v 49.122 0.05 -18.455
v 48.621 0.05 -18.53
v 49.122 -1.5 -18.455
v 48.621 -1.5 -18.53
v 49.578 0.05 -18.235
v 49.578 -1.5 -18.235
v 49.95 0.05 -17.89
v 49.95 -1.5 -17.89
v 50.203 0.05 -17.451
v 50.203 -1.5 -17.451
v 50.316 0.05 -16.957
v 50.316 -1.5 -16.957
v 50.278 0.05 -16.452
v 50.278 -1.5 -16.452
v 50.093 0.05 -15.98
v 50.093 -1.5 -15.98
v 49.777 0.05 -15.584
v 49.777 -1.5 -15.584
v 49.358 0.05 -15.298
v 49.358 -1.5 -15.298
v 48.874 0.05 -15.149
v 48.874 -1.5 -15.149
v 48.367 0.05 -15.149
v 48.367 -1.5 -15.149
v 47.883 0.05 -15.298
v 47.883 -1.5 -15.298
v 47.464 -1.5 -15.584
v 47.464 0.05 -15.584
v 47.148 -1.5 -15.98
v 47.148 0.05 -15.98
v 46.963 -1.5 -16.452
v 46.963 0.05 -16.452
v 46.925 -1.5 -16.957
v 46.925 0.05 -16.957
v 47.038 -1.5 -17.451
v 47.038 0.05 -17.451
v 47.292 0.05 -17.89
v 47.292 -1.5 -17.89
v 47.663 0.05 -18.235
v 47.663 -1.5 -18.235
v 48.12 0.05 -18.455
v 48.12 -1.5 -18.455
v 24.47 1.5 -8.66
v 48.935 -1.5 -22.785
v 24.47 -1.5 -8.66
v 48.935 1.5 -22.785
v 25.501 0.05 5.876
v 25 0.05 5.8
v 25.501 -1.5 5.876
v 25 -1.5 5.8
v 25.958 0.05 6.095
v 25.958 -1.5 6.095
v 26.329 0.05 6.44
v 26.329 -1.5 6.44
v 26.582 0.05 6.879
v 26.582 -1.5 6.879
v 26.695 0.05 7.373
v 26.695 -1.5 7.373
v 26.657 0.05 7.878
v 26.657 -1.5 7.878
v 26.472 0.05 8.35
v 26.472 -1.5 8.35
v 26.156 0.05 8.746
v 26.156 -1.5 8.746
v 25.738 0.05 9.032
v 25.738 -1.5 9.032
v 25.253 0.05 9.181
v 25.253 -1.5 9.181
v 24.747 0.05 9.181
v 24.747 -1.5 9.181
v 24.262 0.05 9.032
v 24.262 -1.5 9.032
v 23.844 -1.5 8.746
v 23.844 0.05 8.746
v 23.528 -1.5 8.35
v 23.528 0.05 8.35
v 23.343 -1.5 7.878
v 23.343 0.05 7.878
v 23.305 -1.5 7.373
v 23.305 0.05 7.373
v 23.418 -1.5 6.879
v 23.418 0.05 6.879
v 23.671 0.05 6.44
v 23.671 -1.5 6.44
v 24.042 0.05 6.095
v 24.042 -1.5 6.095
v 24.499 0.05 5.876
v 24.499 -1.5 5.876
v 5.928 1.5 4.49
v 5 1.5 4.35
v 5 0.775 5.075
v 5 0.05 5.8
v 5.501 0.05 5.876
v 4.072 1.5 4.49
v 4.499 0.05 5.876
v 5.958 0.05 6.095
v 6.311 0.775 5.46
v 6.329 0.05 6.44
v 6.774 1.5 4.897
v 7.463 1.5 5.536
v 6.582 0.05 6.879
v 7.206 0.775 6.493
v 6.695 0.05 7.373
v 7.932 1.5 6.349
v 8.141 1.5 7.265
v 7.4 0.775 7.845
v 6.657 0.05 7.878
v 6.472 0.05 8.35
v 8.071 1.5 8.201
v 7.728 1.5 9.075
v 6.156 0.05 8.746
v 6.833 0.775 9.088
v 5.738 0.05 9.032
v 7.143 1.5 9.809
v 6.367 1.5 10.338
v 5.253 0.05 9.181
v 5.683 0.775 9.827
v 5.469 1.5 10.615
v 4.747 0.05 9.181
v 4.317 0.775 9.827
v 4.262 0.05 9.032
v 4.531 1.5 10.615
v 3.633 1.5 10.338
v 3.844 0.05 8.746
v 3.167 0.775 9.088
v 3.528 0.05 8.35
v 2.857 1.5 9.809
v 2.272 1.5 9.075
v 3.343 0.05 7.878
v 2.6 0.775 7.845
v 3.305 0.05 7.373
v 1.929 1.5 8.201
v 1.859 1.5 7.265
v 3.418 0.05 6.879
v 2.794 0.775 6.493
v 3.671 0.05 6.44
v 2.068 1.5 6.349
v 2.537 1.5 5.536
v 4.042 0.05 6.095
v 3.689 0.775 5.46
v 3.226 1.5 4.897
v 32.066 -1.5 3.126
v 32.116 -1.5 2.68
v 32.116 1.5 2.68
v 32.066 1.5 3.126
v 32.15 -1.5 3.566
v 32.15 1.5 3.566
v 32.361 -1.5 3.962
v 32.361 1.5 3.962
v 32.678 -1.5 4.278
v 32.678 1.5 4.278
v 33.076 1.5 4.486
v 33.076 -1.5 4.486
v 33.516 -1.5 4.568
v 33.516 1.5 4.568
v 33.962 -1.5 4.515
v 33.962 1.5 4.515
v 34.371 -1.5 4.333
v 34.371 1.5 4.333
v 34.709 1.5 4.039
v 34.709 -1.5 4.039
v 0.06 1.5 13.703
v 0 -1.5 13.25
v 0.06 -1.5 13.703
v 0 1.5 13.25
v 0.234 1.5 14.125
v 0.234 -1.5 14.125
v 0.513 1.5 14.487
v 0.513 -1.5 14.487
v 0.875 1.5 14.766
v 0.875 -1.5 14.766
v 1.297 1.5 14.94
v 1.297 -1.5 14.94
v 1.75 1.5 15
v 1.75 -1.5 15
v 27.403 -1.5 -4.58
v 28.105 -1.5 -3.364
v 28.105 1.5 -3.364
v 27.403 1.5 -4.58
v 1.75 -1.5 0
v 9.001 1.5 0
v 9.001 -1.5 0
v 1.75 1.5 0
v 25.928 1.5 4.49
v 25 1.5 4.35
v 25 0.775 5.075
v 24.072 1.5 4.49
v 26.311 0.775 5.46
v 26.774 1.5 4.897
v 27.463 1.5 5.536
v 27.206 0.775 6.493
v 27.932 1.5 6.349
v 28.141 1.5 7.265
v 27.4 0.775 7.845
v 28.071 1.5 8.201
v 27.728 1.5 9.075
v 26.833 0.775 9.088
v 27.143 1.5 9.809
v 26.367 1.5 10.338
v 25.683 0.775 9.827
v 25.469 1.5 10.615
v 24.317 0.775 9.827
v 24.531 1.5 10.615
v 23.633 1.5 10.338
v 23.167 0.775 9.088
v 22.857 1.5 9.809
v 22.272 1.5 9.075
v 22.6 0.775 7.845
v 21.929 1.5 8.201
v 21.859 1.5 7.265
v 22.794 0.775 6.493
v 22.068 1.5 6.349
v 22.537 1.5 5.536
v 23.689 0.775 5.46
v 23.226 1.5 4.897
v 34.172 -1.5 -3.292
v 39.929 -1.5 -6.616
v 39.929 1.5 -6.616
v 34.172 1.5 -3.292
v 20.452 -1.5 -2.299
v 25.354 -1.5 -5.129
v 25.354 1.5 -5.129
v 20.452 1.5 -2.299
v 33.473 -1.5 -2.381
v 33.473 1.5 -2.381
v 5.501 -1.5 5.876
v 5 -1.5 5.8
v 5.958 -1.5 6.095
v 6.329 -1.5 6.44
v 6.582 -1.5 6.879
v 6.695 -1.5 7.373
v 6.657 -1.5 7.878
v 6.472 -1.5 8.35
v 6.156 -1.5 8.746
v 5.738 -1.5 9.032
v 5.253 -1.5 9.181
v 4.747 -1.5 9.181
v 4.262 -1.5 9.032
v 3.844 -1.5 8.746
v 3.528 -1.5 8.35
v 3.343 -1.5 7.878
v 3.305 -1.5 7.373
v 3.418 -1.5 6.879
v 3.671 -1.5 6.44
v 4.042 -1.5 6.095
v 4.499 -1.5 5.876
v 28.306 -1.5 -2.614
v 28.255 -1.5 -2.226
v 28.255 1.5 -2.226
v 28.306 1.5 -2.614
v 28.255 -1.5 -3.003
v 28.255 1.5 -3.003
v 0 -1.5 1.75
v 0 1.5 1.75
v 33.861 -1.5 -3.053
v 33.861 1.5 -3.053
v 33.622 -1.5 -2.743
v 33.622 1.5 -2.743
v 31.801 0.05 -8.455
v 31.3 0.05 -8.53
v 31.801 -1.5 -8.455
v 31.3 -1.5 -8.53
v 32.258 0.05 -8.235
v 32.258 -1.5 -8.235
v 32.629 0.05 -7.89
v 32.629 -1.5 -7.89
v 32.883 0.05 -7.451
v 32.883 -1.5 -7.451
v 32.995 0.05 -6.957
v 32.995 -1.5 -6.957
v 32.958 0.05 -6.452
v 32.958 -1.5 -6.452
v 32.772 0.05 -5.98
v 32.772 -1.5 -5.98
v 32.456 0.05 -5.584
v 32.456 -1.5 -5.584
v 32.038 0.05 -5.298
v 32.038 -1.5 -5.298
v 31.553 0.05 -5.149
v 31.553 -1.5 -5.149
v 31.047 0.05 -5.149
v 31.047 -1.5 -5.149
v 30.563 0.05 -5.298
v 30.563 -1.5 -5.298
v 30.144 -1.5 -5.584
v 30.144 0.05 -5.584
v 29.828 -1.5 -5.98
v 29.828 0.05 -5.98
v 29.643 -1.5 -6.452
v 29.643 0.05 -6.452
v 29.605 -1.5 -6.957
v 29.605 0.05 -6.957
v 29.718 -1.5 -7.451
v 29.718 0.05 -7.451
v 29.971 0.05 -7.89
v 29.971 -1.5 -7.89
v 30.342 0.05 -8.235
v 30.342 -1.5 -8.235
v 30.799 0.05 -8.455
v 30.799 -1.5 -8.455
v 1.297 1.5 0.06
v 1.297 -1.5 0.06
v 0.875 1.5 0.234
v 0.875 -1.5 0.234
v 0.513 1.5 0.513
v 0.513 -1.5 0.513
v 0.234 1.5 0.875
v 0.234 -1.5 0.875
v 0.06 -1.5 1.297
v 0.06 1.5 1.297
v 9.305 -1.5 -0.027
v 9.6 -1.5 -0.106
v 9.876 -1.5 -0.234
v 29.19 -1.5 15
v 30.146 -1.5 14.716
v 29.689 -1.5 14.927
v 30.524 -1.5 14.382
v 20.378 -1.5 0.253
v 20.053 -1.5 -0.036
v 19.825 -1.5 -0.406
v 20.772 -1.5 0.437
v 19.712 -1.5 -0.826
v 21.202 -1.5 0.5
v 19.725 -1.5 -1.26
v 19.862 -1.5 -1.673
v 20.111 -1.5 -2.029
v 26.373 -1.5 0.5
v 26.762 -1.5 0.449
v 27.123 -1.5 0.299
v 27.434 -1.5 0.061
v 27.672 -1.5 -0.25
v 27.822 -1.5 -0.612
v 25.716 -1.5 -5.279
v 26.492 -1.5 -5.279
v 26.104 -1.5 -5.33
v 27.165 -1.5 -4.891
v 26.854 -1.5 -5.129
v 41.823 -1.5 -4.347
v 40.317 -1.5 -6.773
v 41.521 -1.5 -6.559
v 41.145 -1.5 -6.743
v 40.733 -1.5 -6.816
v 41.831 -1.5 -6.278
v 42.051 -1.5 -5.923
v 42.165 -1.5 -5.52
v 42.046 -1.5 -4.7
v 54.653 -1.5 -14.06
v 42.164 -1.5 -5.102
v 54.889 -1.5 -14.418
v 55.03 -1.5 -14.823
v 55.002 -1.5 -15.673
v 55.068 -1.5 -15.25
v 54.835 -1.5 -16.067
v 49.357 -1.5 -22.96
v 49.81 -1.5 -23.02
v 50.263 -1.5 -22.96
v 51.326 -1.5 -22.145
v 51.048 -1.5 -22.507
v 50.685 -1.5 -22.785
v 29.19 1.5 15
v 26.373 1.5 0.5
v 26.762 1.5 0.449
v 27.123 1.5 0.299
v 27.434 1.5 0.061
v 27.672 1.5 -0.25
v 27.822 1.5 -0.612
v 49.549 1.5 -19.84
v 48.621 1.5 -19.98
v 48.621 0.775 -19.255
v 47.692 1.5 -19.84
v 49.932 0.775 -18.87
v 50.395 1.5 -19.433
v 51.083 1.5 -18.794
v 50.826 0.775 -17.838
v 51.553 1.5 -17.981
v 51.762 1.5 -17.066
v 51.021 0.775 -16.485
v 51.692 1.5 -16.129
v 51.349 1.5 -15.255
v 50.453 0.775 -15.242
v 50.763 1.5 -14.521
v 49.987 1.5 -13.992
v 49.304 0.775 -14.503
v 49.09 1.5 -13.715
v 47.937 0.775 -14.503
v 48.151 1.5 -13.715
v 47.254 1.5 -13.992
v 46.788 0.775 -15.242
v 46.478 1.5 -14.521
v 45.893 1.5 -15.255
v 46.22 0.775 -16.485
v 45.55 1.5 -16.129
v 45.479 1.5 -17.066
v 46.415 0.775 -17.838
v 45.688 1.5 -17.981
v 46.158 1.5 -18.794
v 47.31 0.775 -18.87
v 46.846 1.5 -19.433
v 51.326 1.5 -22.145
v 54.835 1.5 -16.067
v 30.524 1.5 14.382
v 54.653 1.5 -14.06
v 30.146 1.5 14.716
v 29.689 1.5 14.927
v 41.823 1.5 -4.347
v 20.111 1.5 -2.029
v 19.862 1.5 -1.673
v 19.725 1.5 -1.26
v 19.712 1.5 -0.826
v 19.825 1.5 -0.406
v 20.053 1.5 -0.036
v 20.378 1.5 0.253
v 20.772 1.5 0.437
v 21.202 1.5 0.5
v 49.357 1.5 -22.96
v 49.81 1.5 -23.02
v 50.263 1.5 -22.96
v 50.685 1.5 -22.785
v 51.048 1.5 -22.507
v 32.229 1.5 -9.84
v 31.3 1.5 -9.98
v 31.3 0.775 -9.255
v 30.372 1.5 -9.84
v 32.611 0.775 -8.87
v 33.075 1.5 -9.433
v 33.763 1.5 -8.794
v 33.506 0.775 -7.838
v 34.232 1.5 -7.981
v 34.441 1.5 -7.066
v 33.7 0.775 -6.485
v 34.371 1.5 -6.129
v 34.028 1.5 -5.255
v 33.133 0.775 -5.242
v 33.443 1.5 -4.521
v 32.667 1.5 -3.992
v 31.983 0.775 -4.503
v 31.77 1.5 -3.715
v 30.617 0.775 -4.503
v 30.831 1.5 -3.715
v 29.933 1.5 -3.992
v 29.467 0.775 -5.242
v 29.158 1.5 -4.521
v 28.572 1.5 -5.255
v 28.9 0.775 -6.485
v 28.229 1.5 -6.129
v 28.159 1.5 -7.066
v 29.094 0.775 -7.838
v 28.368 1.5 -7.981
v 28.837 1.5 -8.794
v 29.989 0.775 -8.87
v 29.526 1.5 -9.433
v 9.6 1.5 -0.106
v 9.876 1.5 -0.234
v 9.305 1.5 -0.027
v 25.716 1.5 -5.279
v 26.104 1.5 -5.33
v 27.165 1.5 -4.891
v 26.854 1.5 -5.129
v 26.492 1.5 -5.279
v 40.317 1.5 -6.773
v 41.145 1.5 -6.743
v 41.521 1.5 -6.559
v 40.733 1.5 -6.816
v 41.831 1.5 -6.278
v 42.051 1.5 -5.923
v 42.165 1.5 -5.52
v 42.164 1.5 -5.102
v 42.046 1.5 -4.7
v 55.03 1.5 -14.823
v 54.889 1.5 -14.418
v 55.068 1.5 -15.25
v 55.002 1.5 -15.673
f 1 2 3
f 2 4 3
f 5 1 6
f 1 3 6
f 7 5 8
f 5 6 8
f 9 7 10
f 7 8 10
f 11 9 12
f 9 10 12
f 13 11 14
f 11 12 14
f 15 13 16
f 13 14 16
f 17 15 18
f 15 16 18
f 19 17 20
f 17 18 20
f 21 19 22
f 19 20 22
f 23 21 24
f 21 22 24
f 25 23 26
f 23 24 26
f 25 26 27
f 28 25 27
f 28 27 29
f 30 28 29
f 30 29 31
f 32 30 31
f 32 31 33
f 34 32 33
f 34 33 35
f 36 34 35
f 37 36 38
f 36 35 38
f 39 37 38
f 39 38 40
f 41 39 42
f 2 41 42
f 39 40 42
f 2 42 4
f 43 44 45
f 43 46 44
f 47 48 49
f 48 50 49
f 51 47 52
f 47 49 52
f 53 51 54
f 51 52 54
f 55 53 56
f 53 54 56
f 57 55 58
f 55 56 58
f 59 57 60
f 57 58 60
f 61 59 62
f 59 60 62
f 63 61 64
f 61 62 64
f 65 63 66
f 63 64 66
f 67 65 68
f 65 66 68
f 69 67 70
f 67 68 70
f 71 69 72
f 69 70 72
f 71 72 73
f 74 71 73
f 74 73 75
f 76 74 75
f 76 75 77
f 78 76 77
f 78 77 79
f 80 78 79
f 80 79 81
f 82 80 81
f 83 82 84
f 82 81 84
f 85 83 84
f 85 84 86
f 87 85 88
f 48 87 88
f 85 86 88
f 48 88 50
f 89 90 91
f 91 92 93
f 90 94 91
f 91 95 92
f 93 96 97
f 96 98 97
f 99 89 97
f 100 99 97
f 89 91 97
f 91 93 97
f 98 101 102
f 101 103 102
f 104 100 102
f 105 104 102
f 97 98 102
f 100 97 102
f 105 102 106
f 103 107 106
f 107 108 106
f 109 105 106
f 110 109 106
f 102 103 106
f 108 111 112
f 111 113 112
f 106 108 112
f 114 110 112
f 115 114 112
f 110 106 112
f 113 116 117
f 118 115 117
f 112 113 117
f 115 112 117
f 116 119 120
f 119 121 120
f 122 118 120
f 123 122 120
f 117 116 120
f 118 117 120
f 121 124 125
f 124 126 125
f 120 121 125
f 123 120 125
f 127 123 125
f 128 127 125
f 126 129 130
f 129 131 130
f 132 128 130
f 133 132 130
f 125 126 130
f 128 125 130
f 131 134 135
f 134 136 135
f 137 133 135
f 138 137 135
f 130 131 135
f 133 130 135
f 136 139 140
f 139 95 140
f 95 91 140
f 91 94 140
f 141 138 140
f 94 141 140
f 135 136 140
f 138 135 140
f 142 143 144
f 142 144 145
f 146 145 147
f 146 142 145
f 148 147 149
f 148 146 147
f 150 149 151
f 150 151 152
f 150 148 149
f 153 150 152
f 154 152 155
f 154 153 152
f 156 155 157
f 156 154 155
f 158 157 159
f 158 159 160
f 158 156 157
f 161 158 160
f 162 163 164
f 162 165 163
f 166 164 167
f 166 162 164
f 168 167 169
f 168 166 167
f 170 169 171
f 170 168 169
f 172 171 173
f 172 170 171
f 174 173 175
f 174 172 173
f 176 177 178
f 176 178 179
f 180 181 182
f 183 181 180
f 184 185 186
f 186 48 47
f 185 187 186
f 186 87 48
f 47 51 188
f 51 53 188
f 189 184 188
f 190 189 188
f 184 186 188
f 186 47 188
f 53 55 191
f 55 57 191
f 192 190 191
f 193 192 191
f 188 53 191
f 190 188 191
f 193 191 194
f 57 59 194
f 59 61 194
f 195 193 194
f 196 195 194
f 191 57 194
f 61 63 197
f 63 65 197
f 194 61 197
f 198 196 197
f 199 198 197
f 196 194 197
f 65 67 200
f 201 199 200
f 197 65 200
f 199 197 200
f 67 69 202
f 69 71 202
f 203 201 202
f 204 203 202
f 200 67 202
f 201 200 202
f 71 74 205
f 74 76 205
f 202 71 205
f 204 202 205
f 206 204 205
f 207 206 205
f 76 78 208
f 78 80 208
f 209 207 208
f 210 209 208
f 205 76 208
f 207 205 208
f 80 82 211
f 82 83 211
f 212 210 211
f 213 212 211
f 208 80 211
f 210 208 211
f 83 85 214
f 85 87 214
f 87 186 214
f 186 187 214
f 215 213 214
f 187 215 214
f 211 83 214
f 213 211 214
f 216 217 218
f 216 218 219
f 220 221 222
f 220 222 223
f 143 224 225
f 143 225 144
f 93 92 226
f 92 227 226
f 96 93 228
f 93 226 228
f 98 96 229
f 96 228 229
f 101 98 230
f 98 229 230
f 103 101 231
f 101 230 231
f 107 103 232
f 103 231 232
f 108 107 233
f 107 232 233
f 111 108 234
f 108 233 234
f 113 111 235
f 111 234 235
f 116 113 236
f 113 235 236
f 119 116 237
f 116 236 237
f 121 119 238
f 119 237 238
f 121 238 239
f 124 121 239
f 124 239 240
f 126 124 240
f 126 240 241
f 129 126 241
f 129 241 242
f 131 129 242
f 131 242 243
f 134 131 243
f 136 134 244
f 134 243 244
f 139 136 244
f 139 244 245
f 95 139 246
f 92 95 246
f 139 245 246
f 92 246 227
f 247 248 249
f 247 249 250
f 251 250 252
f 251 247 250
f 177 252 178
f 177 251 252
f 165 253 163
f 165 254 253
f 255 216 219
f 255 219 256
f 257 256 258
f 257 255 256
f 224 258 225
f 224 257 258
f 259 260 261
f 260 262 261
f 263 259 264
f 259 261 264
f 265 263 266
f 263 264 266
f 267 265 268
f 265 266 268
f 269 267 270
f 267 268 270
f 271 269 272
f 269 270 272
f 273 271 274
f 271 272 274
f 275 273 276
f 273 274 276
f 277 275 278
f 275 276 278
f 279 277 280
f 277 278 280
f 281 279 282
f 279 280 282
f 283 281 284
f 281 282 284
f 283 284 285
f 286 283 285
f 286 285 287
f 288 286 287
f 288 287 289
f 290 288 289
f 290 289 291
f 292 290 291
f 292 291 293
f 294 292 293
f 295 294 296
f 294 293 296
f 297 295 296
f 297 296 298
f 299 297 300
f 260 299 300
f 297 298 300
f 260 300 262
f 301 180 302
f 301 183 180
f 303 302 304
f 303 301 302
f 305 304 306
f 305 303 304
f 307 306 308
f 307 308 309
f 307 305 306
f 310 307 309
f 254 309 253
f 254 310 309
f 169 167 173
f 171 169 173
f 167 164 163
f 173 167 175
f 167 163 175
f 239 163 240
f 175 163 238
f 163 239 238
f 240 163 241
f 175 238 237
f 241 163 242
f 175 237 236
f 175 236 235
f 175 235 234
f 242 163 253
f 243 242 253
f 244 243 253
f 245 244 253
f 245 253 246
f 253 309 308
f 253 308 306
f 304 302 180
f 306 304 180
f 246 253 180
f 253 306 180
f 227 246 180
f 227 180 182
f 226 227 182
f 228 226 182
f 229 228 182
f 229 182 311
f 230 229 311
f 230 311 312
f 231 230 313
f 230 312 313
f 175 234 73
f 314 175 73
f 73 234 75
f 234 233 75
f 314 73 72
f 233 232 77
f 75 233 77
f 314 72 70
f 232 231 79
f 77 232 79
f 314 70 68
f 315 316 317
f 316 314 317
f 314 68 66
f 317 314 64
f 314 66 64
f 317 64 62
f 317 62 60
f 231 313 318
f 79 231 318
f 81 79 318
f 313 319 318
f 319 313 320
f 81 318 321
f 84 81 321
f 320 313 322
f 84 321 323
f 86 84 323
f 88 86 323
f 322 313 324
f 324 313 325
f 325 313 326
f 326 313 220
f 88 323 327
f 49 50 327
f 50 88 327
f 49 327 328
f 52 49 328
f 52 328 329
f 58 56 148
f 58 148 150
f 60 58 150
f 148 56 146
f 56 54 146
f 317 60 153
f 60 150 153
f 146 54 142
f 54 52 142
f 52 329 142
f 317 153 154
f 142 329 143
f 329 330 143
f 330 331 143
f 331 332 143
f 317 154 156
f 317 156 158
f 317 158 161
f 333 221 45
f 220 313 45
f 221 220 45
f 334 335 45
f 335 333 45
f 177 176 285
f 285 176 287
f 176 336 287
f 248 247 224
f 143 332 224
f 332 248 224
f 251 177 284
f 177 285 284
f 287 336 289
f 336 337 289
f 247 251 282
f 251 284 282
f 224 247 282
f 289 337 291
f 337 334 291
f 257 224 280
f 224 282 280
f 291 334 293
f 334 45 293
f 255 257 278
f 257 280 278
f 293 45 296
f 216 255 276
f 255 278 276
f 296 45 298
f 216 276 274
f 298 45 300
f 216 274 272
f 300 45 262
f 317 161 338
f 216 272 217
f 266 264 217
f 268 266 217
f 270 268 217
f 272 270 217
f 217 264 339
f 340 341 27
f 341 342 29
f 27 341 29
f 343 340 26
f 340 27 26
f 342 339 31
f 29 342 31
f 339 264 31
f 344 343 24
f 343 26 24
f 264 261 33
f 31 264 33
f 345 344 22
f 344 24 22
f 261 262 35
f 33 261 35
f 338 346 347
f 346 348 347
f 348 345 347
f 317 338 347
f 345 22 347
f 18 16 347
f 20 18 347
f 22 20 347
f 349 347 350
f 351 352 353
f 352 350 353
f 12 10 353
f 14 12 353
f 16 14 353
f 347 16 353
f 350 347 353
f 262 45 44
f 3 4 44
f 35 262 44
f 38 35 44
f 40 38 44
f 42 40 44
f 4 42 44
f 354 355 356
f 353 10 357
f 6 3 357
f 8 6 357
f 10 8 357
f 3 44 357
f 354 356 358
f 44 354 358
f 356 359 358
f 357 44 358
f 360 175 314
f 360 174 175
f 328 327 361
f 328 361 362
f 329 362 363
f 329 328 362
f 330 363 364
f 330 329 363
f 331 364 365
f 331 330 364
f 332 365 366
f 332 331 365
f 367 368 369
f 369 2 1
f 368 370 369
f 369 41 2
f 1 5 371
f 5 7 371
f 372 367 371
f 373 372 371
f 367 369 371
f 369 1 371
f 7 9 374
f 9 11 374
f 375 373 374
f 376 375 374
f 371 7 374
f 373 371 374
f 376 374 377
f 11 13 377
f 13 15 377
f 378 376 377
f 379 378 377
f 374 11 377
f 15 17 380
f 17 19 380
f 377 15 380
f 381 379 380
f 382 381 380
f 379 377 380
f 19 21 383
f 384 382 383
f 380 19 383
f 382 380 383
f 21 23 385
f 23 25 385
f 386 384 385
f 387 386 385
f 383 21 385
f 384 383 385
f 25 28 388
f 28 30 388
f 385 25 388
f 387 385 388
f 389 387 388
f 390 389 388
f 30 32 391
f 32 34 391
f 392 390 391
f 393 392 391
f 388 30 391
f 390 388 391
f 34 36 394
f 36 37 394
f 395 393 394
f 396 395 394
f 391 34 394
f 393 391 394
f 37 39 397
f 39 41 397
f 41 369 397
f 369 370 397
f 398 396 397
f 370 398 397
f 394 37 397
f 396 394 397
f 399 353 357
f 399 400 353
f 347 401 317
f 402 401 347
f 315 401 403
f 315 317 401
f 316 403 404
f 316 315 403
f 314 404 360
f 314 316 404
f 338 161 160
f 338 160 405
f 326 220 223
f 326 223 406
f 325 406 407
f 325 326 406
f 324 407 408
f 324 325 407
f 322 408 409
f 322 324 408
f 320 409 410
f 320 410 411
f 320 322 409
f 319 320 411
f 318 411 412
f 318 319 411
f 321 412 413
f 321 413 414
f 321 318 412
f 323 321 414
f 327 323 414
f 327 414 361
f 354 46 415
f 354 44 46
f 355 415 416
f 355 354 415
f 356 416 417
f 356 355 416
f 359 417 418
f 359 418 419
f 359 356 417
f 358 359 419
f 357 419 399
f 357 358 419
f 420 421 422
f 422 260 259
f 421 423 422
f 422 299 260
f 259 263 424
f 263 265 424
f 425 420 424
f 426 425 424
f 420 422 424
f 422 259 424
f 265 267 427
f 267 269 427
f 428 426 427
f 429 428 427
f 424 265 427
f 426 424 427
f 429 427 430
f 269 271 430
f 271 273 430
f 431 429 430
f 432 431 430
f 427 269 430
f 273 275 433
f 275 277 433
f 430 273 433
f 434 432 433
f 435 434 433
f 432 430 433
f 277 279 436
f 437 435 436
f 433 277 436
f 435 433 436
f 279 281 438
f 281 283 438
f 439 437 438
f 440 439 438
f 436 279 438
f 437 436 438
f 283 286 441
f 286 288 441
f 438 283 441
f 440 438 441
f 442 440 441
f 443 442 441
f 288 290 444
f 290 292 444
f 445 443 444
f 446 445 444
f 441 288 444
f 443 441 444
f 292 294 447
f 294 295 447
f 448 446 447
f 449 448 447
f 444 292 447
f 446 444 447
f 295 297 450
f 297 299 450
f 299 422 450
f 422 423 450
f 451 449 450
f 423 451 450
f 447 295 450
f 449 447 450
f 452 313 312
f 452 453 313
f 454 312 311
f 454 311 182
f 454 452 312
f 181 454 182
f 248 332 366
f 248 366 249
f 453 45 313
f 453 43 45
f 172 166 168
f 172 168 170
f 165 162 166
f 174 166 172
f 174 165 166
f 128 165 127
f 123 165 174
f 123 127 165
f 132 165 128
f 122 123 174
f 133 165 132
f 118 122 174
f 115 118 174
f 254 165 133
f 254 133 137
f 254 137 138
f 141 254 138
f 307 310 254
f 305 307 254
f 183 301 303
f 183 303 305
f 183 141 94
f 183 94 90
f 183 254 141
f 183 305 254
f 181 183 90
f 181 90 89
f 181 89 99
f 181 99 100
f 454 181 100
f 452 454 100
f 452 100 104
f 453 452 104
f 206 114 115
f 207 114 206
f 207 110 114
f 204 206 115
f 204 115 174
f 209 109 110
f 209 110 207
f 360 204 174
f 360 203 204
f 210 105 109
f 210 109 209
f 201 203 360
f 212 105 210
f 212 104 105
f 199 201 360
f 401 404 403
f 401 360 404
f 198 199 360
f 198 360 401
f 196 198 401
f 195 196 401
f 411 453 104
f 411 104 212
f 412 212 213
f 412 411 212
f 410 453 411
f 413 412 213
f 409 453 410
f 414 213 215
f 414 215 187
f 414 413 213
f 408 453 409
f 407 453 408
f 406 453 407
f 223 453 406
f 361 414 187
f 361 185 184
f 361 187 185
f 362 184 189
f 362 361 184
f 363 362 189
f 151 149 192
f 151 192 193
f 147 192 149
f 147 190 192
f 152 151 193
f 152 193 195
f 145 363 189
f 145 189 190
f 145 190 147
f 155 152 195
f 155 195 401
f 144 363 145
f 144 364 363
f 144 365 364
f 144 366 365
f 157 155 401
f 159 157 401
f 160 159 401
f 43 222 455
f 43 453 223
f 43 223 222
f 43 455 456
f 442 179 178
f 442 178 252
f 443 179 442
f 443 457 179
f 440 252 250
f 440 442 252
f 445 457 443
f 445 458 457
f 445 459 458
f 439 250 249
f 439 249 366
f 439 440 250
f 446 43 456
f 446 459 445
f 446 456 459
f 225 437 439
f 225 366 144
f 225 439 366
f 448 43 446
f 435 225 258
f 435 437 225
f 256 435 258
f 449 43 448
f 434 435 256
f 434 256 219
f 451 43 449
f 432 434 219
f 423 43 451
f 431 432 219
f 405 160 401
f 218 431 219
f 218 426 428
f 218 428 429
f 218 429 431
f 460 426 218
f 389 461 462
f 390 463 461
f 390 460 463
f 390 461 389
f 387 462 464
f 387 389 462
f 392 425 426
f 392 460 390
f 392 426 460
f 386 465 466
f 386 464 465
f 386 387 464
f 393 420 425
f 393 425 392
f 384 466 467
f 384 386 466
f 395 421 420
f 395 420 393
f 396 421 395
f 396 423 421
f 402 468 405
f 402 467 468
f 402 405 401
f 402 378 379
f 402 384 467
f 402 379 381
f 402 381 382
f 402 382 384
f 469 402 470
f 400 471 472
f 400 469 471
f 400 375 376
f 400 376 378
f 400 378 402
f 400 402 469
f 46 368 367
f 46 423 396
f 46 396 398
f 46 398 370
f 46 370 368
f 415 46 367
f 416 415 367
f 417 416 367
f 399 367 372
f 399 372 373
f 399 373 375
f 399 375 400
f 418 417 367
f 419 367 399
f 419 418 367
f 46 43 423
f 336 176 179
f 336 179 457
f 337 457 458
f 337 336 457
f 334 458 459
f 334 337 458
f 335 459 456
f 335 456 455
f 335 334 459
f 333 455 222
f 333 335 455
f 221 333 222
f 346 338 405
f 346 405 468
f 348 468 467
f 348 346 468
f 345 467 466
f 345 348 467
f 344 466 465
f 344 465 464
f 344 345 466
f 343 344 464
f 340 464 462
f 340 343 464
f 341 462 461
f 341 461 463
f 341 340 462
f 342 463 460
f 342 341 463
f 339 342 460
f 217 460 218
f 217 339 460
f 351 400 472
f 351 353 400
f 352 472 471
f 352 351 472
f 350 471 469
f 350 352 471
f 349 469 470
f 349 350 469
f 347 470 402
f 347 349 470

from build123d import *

# Parameters (mm, degrees)
SKETCH_2_R                   = 1.6
EXTRUDE_1_DEPTH              = 1.5
CUT_EXTRUDE_1_DEPTH          = 3
FILLET_1_R                   = 1
FILLET_2_R                   = 1.75
HOLE_WIZARD_M3_1_D           = 3.4
HOLE_WIZARD_M3_1_DEPTH       = 18.978536948
HOLE_WIZARD_M3_1_CSINK_D     = 6.3
HOLE_WIZARD_M3_1_CSINK_ANGLE = 90
HOLE_WIZARD_M3_1_TIP         = 1.021463052
MOVE_START                   = -1.5
MOVE_FACE_1_DEPTH            = 3


# Read off the part's stored shape, not the designer's step: 面の移動1
with BuildPart() as part:
    # ｽｹｯﾁ2 → ﾎﾞｽ - 押し出し1 (new, symmetric)
    with BuildSketch(Plane(origin=(0, 0, 0), x_dir=(1, 0, 0), z_dir=(0, 1, 0))):
        Polygon((24.47, 8.660254038), (9.47, 0), (0, 0), (0, -15), (30, -15), (55.450762114, 15), (50.450762114, 23.660254038), align=None)
        with Locations(Location((48.620635095, 16.830127019, 0), (0, 0, 270))):
            Circle(SKETCH_2_R, mode=Mode.SUBTRACT)
        with Locations(Location((25, -7.5, 0), (0, 0, 270))):
            Circle(SKETCH_2_R, mode=Mode.SUBTRACT)
        with Locations(Location((31.300127019, 6.830127019, 0), (0, 0, 270))):
            Circle(SKETCH_2_R, mode=Mode.SUBTRACT)
        with Locations(Location((5, -7.5, 0), (0, 0, 270))):
            Circle(SKETCH_2_R, mode=Mode.SUBTRACT)
    extrude(amount=EXTRUDE_1_DEPTH, both=True)

    # ｽｹｯﾁ3 → ｶｯﾄ - 押し出し1 (cut)
    with BuildSketch(Plane(origin=(0, 1.5, 0), x_dir=(1, 0, 0), z_dir=(0, 1, 0))):
        Polygon((26.47, 5.196152423), (17.47, 0), (27.140628594, 0), (27.879009742, 2.755675961), align=None)
        Polygon((33.352285677, 0), (37.479868618, 0), (45.169472556, 9.064094706), (34.062793268, 2.651650429), align=None)
        Polygon((31.44676478, -7.111500799), (37.479868618, 0), (33.352285677, 0), align=None)
    extrude(amount=-CUT_EXTRUDE_1_DEPTH, mode=Mode.SUBTRACT)

    # ﾌｨﾚｯﾄ1
    fillet_1_edges = [part.edges().sort_by_distance(p)[0] for p in [
        (27.879009742, 0, -2.755675961),
        (27.140628594, 0, 0),
        (17.47, 0, 0),
        (26.47, 0, -5.196152423),
        (34.062793268, 0, -2.651650429),
        (45.169472556, 0, -9.064094706),
        (31.44676478, 0, 7.111500799),
    ]]
    fillet(fillet_1_edges, radius=FILLET_1_R)

    # ﾌｨﾚｯﾄ2
    fillet_2_edges = [part.edges().sort_by_distance(p)[0] for p in [
        (50.450762114, 0, -23.660254038),
        (55.450762114, 0, -15),
        (30, 0, 15),
        (0, 0, 15),
        (0, 0, 0),
        (9.47, 0, 0),
    ]]
    fillet(fillet_2_edges, radius=FILLET_2_R)

    # M3 丸皿ねじ用皿穴1
    with Locations(Plane(origin=(5, 1.5, 7.5), x_dir=(0, 0, 1), z_dir=(0, 1, 0))):
        with Locations((0, 0), (0, 20), (-14.330127019, 26.300127019), (-24.330127019, 43.620635095)):
            CounterSinkHole(HOLE_WIZARD_M3_1_D / 2, HOLE_WIZARD_M3_1_CSINK_D / 2, depth=HOLE_WIZARD_M3_1_DEPTH, counter_sink_angle=HOLE_WIZARD_M3_1_CSINK_ANGLE)
            with Locations((0, 0, -(HOLE_WIZARD_M3_1_DEPTH + HOLE_WIZARD_M3_1_TIP / 2))):  # 118° drill point
                Cone(0, HOLE_WIZARD_M3_1_D / 2, HOLE_WIZARD_M3_1_TIP, mode=Mode.SUBTRACT)

    # Move Face 1 outline → Move Face 1 (cut)
    # profile 1 of 2: a face of its own
    with BuildSketch(Plane(origin=(0, 0, 0), x_dir=(1, 0, 0), z_dir=(0, 1, 0)).offset(MOVE_START)):
        with BuildLine():
            Line((39.92911769, 6.615924683), (34.171512735, 3.291769913))
            ThreePointArc((34.171512735, 3.291769913), (33.731482725, 2.90587395), (33.472623996, 2.380960375))
            Line((33.472623996, 2.380960375), (32.116497814, -2.680171439))
            ThreePointArc((32.116497814, -2.680171439), (32.869167953, -4.39703828), (34.709221416, -4.038782306))
            Line((34.709221416, -4.038782306), (41.822952552, 4.346504278))
            ThreePointArc((41.822952552, 4.346504278), (41.830787659, 6.27795696), (39.92911769, 6.615924683))
        make_face()
        with BuildLine():
            ThreePointArc((33.955586909, 2.251550852), (34.128159395, 2.601493236), (34.421512735, 2.858757211))
            Line((34.421512735, 2.858757211), (40.17911769, 6.182911981))
            ThreePointArc((40.17911769, 6.182911981), (41.44689767, 5.957600166), (41.441674265, 4.669965044))
            Line((41.441674265, 4.669965044), (34.327943128, -3.71532154))
            ThreePointArc((34.327943128, -3.71532154), (33.10124082, -3.954158856), (32.599460727, -2.809580962))
            Line((32.599460727, -2.809580962), (33.955586909, 2.251550852))
        make_face(mode=Mode.SUBTRACT)
    # profile 2 of 2: a face of its own
    with BuildSketch(Plane(origin=(0, 0, 0), x_dir=(1, 0, 0), z_dir=(0, 1, 0)).offset(MOVE_START)):
        with BuildLine():
            Line((27.822190346, 0.611771432), (28.254766297, 2.226166861))
            ThreePointArc((28.254766297, 2.226166861), (28.293044849, 2.810184717), (28.104915663, 3.364395428))
            Line((28.104915663, 3.364395428), (27.403012702, 4.580127019))
            ThreePointArc((27.403012702, 4.580127019), (26.492203164, 5.279015758), (25.353974596, 5.129165125))
            Line((25.353974596, 5.129165125), (20.452050808, 2.299038106))
            ThreePointArc((20.452050808, 2.299038106), (19.753162068, 0.611771432), (21.202050808, -0.5))
            Line((21.202050808, -0.5), (26.373301606, -0.5))
            ThreePointArc((26.373301606, -0.5), (27.286443749, -0.19003001), (27.822190346, 0.611771432))
        make_face()
        with BuildLine():
            Line((26.373301606, 0), (21.202050808, 0))
            ThreePointArc((21.202050808, 0), (20.236124981, 0.741180955), (20.702050808, 1.866025404))
            Line((20.702050808, 1.866025404), (25.603974596, 4.696152423))
            ThreePointArc((25.603974596, 4.696152423), (26.362793641, 4.796052845), (26.97, 4.330127019))
            Line((26.97, 4.330127019), (27.671902961, 3.114395428))
            ThreePointArc((27.671902961, 3.114395428), (27.797322419, 2.74492162), (27.771803384, 2.355576383))
            Line((27.771803384, 2.355576383), (27.339227432, 0.741180955))
            ThreePointArc((27.339227432, 0.741180955), (26.982063035, 0.20664666), (26.373301606, 0))
        make_face(mode=Mode.SUBTRACT)
    extrude(amount=MOVE_FACE_1_DEPTH, mode=Mode.SUBTRACT)


solid = part.part
